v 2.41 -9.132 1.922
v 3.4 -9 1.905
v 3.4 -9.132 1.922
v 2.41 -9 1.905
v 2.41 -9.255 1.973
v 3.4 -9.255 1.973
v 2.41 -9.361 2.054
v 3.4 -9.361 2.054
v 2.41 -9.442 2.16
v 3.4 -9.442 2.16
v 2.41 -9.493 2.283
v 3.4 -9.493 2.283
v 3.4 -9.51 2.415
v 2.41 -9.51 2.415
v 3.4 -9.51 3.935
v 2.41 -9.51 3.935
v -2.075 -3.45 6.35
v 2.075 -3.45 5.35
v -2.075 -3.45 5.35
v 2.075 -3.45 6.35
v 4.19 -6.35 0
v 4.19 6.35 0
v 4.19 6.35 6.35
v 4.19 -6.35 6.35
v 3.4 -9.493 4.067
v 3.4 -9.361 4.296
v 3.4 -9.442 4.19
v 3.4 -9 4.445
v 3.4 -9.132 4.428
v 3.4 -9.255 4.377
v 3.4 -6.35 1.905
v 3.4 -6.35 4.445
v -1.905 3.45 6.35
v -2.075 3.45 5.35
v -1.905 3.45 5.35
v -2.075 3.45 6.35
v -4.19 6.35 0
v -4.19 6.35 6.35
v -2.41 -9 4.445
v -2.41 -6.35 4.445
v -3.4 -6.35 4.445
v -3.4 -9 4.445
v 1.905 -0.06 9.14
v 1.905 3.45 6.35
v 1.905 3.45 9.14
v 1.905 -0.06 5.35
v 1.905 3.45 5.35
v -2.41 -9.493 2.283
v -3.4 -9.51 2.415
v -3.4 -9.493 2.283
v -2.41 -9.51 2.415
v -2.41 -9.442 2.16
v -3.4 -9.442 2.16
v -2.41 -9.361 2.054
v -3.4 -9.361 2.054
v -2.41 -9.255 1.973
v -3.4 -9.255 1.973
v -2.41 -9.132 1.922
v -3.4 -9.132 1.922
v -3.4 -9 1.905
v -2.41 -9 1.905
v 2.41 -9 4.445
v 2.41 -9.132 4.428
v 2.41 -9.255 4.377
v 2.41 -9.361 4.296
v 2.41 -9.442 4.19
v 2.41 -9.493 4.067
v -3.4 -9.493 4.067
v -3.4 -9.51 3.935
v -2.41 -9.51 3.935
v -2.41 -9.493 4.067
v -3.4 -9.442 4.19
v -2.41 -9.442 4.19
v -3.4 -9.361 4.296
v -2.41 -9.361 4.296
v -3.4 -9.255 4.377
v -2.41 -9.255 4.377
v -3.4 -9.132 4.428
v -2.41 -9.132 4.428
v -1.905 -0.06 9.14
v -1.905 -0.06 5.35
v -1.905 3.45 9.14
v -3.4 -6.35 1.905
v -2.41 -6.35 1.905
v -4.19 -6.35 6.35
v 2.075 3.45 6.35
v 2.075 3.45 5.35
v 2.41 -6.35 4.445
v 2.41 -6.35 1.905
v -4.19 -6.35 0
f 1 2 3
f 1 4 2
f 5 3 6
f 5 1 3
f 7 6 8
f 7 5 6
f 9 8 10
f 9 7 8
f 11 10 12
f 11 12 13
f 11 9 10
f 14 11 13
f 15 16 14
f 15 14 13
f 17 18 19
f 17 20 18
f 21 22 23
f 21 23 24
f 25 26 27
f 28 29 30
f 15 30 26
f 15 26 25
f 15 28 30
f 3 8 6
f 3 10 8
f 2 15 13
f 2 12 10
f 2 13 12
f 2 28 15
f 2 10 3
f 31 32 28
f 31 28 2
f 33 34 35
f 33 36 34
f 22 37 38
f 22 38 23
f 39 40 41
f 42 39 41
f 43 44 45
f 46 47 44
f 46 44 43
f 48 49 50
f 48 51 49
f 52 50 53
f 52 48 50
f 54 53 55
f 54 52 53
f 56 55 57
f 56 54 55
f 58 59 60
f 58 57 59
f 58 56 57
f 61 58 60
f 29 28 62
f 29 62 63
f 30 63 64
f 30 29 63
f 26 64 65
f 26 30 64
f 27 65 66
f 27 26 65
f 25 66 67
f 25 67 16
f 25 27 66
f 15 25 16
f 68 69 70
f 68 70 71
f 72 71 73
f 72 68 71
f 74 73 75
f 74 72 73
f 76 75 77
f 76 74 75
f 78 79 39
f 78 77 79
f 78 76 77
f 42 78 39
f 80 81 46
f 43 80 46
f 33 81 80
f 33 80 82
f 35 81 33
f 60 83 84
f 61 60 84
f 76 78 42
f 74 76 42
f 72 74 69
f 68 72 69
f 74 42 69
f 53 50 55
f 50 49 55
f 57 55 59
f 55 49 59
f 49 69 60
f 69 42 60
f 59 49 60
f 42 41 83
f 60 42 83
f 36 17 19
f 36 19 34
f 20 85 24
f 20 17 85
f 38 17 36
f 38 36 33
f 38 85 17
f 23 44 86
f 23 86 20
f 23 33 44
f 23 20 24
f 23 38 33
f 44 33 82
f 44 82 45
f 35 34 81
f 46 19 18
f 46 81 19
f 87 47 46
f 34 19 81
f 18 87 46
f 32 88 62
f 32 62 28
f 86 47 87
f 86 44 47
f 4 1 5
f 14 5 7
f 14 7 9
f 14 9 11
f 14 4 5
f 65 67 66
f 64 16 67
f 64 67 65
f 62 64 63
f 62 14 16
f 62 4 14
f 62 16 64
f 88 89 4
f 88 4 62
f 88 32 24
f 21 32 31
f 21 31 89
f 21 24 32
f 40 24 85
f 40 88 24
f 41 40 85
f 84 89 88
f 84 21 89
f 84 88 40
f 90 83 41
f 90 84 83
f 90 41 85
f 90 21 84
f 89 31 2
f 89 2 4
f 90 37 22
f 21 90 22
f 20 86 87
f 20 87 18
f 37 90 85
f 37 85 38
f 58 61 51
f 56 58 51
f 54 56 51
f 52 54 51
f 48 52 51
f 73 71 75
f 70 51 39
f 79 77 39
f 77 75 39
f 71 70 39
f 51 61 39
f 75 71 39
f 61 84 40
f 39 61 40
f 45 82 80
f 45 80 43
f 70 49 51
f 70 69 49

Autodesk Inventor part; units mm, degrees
ref_plane "YZ Plane" through (0, 0, 0) normal (1, 0, 0) x (0, 1, 0)
ref_plane "XZ Plane" through (0, 0, 0) normal (0, 1, 0) x (-1, 0, 0)
ref_plane "XY Plane" through (0, 0, 0) normal (0, 0, 1) x (1, 0, 0)
sketch "Sketch1" plane through (0, 0, 0) normal (0, 0, 1) x (1, 0, 0)
  line L0 (-4.19, 6.35) -> (4.19, 6.35)
  line L1 (4.19, 6.35) -> (4.19, -6.35)
  line L2 (4.19, -6.35) -> (-4.19, -6.35)
  line L3 (-4.19, -6.35) -> (-4.19, 6.35)
  line L4 (0, 0) -> (4.19, 0) construction
  line L5 (0, 0) -> (0, -6.35) construction
  dimension "d0" = 8.38
  dimension "d1" = 12.7
extrude "Extrusion1" add sketch "Sketch1" along normal blind 6.35
sketch "Sketch2" plane through (0, 0, 6.35) normal (0, 0, 1) x (1, 0, 0)
  line L0 (0, 0) -> (0, 14.132) construction
  line L1 (-2.075, 3.45) -> (2.075, 3.45)
  line L2 (2.075, 3.45) -> (2.075, -3.45)
  line L3 (2.075, -3.45) -> (-2.075, -3.45)
  line L4 (-2.075, -3.45) -> (-2.075, 3.45)
  line L5 (2.075, 0.15) -> (2.075, -3.45)
  line L6 (2.075, -3.45) -> (-2.075, -3.45)
  line L7 (-2.075, -3.45) -> (-2.075, 0.15)
  line L8 (0, 0) -> (4.19, 0) construction
  line L9 (4.19, -6.35) -> (4.19, 6.35) construction
  dimension "d4" = 4.15
  dimension "d20" = 6.9
extrude "Extrusion2" cut sketch "Sketch2" against normal blind 1
sketch "Sketch3" plane through (0, 0, 6.35) normal (0, 0, 1) x (1, 0, 0)
  line L0 (0, 0) -> (0, 14.132) construction
  line L1 (-1.905, 3.45) -> (1.905, 3.45)
  line L2 (1.905, 3.45) -> (1.905, -3.45)
  line L3 (1.905, -3.45) -> (-1.905, -3.45)
  line L4 (-1.905, -3.45) -> (-1.905, 3.45)
  line L5 (-1.905, -0.06) -> (1.905, -0.06)
  line L6 (1.905, -0.06) -> (1.905, -3.45)
  line L7 (1.905, -3.45) -> (-1.905, -3.45)
  line L8 (-1.905, -3.45) -> (-1.905, -0.06)
  line L9 (0, 0) -> (4.19, 0) construction
  line L10 (4.19, -6.35) -> (4.19, 6.35) construction
  line L11 (-2.075, 3.45) -> (2.075, 3.45) projected
  line L12 (2.075, -3.45) -> (-2.075, -3.45) projected
  point P0 (1.905, -0.06)
  dimension "d9" = 3.81
  dimension "d11" = 3.51
extrude "Extrusion3" add sketch "Sketch3" along normal blind 9.14 from surface at -6.35 contours L1 L2 L5 L4
sketch "Sketch4" plane through (-4.19, -6.35, 0) normal (0, -1, 0) x (1, 0, 0)
  line L0 (0, 0) -> (0, 6.35) construction
  line L1 (0, 3.175) -> (8.38, 3.175) construction
  line L2 (8.38, 0) -> (8.38, 6.35) construction
  line L3 (4.19, 0) -> (4.19, 6.35) construction
  line L4 (8.38, 6.35) -> (0, 6.35) construction
  line L5 (6.6, 4.445) -> (7.59, 4.445)
  line L6 (7.59, 4.445) -> (7.59, 1.905)
  line L7 (7.59, 1.905) -> (6.6, 1.905)
  line L8 (6.6, 1.905) -> (6.6, 4.445)
  line L9 (7.095, 4.445) -> (7.095, 1.905) construction
  line L10 (1.78, 4.445) -> (0.79, 4.445)
  line L11 (0.79, 4.445) -> (0.79, 1.905)
  line L12 (0.79, 1.905) -> (1.78, 1.905)
  line L13 (1.78, 1.905) -> (1.78, 4.445)
  line L14 (1.285, 4.445) -> (1.285, 1.905) construction
  dimension "d14" = 0.99
  dimension "d15" = 2.54
  dimension "d24" = 6.8
extrude "Extrusion4" add sketch "Sketch4" along normal blind 3.16
fillet "Fillet1" radius 0.51 4 edges at (-2.905, -9.51, 4.445) (-2.905, -9.51, 1.905) (2.905, -9.51, 4.445) (2.905, -9.51, 1.905)
equation "\"d7\" = switchTrackExtrusion"
equation "\"switchTrackExtrusion\" = 1"
properties part number "Switch_Base"
